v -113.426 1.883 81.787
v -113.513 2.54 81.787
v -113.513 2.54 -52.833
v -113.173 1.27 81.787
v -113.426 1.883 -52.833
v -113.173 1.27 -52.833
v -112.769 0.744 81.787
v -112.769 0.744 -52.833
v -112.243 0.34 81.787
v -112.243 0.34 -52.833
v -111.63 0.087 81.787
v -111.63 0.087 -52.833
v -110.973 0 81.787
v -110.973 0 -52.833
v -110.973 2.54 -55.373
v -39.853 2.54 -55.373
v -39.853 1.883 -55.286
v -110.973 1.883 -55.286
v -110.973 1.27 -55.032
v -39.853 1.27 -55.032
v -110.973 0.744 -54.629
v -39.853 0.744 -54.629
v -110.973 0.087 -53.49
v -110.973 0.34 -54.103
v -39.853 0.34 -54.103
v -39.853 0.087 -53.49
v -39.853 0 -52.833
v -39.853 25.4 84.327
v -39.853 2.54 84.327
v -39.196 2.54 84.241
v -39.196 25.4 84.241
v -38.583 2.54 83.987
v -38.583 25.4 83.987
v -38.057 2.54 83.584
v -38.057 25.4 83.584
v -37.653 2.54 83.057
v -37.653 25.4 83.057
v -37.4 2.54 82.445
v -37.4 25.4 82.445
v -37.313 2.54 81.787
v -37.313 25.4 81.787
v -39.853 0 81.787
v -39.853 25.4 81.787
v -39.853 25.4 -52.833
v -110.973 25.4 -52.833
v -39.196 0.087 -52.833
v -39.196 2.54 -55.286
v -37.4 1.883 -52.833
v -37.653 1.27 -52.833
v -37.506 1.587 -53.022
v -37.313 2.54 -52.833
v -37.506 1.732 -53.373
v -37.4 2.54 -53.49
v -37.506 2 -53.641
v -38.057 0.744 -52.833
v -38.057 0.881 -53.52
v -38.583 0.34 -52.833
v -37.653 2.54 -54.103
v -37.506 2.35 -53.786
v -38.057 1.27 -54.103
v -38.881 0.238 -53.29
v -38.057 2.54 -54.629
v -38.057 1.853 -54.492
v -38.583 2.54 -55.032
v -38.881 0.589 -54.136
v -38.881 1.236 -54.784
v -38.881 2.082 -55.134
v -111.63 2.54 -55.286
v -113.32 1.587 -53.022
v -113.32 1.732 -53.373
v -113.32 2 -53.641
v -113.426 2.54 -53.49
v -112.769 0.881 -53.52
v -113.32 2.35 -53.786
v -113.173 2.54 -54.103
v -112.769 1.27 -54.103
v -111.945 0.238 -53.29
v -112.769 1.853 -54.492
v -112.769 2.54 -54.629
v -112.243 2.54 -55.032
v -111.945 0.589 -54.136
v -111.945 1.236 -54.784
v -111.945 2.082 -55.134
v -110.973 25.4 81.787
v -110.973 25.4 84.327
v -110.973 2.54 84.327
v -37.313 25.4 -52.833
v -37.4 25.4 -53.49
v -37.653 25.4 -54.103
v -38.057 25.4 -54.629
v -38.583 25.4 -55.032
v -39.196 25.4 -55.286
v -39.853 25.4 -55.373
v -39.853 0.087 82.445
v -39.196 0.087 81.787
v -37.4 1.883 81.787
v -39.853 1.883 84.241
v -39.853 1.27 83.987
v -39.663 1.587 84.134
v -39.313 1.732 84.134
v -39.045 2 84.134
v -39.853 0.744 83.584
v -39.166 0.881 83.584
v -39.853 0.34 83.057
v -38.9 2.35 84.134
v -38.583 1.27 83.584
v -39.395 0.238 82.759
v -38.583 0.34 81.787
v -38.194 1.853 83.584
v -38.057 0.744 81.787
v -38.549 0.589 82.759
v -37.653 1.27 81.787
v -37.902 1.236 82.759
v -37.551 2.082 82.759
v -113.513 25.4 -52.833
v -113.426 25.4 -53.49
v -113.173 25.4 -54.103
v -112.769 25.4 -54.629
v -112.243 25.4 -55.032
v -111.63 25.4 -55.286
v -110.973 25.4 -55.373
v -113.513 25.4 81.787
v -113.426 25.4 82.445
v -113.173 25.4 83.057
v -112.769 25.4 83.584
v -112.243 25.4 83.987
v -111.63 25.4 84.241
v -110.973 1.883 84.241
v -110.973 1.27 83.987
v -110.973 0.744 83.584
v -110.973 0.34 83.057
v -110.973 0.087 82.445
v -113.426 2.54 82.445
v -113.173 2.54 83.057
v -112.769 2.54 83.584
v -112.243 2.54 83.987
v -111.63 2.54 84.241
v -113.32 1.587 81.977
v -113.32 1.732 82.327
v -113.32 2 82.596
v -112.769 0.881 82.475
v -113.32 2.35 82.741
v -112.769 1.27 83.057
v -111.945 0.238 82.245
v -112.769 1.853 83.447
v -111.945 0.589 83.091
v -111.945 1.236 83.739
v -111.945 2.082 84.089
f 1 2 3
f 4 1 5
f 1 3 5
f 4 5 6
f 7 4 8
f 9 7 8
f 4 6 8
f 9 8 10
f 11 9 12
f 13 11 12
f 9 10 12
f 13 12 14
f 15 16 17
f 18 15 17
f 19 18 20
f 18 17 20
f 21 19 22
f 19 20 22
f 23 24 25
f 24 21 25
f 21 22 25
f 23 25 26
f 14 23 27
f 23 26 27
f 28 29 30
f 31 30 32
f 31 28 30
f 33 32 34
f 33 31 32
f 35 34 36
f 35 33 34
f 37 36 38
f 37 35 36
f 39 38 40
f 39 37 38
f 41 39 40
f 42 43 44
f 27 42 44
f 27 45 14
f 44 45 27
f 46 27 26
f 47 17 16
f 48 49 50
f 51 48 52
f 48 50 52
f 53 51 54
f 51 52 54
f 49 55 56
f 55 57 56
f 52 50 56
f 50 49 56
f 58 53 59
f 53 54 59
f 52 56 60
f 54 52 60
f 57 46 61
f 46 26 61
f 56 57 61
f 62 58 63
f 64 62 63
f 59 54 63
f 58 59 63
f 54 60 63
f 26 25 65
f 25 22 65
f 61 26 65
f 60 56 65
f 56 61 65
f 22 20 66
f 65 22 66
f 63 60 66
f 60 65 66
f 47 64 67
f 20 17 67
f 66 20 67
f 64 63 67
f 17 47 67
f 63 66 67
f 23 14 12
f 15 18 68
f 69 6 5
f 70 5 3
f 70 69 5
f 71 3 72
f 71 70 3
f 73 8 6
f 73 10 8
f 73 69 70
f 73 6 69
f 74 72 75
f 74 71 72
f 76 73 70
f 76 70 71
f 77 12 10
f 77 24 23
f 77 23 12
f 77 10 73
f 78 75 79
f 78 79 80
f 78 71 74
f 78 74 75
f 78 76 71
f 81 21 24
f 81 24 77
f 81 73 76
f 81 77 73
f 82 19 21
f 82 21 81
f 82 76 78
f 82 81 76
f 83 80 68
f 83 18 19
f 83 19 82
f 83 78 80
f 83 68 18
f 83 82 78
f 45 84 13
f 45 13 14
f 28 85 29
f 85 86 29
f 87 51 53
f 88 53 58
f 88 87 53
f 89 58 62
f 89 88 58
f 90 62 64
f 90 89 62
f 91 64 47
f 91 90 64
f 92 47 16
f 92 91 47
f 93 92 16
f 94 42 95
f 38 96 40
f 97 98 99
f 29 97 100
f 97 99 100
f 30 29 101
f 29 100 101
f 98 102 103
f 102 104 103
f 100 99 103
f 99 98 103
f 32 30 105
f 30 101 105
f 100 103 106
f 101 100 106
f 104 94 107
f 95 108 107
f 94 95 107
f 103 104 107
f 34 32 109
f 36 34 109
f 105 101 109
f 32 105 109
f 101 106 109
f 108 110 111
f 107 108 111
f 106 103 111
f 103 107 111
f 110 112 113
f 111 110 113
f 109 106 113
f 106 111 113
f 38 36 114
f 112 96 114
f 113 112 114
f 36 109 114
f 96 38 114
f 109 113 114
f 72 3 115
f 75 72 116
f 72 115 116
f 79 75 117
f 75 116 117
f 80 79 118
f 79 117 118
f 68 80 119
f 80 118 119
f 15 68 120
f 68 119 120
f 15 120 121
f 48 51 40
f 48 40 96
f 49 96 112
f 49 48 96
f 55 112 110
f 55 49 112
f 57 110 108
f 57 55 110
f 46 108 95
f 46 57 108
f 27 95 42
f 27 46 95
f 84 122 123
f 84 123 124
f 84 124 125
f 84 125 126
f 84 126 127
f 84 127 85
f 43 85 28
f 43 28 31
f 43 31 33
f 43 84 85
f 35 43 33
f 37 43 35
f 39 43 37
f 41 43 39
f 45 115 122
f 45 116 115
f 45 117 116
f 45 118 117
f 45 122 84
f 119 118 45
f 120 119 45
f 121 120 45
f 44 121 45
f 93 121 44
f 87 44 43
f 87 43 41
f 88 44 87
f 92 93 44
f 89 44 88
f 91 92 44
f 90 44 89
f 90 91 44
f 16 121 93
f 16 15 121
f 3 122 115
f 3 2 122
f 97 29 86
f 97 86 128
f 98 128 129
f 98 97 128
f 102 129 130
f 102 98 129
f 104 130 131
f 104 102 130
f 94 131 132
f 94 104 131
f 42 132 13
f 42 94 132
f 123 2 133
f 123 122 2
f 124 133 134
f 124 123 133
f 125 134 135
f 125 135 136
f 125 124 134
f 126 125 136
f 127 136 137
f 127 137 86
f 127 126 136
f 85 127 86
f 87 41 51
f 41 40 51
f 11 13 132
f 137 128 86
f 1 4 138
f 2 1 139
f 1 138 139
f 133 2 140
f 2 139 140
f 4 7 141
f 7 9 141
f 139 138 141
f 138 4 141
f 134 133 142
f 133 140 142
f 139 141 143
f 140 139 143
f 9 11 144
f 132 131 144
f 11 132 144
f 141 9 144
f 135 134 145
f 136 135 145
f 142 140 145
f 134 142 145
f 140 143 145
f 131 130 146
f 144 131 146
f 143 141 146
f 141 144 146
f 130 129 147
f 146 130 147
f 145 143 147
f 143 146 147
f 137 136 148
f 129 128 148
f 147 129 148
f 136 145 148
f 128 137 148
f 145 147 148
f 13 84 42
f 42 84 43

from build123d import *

# Parameters (mm, degrees)
SKETCH1_W           = 76.2
SKETCH1_H           = 139.7
BOSS_EXTRUDE1_DEPTH = 25.4
FILLET1_R           = 2.54
SHELL1_START        = -110.973034188
SHELL1_OUTLINE_W    = 20.32
SHELL1_OUTLINE_H    = 134.62
SHELL1_DEPTH        = 71.12
SKETCH5_W           = 71.12
SKETCH5_H           = 134.62
CUT_EXTRUDE1_DEPTH  = 25.4


# Read off the part's stored shape, not the designer's step: Shell1
with BuildPart() as part:
    # Sketch1 → Boss-Extrude1 (new body)
    with BuildSketch(Plane(origin=(0, 0, 0), x_dir=(1, 0, 0), z_dir=(0, 1, 0))):
        with Locations((-75.413034188, -14.477457265)):
            Rectangle(SKETCH1_W, SKETCH1_H)
    extrude(amount=BOSS_EXTRUDE1_DEPTH)

    # Fillet1
    fillet1_edges = [part.edges().sort_by_distance(p)[0] for p in [
        (-75.413034188, 0, -55.372542735),
        (-37.313034188, 0, 14.477457265),
        (-75.413034188, 0, 84.327457265),
        (-113.513034188, 0, 14.477457265),
        (-113.513034188, 12.7, -55.372542735),
        (-37.313034188, 12.7, -55.372542735),
        (-37.313034188, 12.7, 84.327457265),
        (-113.513034188, 12.7, 84.327457265),
    ]]
    fillet(fillet1_edges, radius=FILLET1_R)

    # Shell1 outline → Shell1 (cut)
    with BuildSketch(Plane.YZ.offset(SHELL1_START)):
        with Locations((12.7, 14.477457265)):
            Rectangle(SHELL1_OUTLINE_W, SHELL1_OUTLINE_H)
    extrude(amount=SHELL1_DEPTH, mode=Mode.SUBTRACT)

    # Sketch5 → Cut-Extrude1 (cut)
    with BuildSketch(Plane(origin=(0, 25.4, 0), x_dir=(1, 0, 0), z_dir=(0, 1, 0))):
        with Locations((-75.413034188, -14.477457265)):
            Rectangle(SKETCH5_W, SKETCH5_H)
    extrude(amount=-CUT_EXTRUDE1_DEPTH, mode=Mode.SUBTRACT)


solid = part.part
